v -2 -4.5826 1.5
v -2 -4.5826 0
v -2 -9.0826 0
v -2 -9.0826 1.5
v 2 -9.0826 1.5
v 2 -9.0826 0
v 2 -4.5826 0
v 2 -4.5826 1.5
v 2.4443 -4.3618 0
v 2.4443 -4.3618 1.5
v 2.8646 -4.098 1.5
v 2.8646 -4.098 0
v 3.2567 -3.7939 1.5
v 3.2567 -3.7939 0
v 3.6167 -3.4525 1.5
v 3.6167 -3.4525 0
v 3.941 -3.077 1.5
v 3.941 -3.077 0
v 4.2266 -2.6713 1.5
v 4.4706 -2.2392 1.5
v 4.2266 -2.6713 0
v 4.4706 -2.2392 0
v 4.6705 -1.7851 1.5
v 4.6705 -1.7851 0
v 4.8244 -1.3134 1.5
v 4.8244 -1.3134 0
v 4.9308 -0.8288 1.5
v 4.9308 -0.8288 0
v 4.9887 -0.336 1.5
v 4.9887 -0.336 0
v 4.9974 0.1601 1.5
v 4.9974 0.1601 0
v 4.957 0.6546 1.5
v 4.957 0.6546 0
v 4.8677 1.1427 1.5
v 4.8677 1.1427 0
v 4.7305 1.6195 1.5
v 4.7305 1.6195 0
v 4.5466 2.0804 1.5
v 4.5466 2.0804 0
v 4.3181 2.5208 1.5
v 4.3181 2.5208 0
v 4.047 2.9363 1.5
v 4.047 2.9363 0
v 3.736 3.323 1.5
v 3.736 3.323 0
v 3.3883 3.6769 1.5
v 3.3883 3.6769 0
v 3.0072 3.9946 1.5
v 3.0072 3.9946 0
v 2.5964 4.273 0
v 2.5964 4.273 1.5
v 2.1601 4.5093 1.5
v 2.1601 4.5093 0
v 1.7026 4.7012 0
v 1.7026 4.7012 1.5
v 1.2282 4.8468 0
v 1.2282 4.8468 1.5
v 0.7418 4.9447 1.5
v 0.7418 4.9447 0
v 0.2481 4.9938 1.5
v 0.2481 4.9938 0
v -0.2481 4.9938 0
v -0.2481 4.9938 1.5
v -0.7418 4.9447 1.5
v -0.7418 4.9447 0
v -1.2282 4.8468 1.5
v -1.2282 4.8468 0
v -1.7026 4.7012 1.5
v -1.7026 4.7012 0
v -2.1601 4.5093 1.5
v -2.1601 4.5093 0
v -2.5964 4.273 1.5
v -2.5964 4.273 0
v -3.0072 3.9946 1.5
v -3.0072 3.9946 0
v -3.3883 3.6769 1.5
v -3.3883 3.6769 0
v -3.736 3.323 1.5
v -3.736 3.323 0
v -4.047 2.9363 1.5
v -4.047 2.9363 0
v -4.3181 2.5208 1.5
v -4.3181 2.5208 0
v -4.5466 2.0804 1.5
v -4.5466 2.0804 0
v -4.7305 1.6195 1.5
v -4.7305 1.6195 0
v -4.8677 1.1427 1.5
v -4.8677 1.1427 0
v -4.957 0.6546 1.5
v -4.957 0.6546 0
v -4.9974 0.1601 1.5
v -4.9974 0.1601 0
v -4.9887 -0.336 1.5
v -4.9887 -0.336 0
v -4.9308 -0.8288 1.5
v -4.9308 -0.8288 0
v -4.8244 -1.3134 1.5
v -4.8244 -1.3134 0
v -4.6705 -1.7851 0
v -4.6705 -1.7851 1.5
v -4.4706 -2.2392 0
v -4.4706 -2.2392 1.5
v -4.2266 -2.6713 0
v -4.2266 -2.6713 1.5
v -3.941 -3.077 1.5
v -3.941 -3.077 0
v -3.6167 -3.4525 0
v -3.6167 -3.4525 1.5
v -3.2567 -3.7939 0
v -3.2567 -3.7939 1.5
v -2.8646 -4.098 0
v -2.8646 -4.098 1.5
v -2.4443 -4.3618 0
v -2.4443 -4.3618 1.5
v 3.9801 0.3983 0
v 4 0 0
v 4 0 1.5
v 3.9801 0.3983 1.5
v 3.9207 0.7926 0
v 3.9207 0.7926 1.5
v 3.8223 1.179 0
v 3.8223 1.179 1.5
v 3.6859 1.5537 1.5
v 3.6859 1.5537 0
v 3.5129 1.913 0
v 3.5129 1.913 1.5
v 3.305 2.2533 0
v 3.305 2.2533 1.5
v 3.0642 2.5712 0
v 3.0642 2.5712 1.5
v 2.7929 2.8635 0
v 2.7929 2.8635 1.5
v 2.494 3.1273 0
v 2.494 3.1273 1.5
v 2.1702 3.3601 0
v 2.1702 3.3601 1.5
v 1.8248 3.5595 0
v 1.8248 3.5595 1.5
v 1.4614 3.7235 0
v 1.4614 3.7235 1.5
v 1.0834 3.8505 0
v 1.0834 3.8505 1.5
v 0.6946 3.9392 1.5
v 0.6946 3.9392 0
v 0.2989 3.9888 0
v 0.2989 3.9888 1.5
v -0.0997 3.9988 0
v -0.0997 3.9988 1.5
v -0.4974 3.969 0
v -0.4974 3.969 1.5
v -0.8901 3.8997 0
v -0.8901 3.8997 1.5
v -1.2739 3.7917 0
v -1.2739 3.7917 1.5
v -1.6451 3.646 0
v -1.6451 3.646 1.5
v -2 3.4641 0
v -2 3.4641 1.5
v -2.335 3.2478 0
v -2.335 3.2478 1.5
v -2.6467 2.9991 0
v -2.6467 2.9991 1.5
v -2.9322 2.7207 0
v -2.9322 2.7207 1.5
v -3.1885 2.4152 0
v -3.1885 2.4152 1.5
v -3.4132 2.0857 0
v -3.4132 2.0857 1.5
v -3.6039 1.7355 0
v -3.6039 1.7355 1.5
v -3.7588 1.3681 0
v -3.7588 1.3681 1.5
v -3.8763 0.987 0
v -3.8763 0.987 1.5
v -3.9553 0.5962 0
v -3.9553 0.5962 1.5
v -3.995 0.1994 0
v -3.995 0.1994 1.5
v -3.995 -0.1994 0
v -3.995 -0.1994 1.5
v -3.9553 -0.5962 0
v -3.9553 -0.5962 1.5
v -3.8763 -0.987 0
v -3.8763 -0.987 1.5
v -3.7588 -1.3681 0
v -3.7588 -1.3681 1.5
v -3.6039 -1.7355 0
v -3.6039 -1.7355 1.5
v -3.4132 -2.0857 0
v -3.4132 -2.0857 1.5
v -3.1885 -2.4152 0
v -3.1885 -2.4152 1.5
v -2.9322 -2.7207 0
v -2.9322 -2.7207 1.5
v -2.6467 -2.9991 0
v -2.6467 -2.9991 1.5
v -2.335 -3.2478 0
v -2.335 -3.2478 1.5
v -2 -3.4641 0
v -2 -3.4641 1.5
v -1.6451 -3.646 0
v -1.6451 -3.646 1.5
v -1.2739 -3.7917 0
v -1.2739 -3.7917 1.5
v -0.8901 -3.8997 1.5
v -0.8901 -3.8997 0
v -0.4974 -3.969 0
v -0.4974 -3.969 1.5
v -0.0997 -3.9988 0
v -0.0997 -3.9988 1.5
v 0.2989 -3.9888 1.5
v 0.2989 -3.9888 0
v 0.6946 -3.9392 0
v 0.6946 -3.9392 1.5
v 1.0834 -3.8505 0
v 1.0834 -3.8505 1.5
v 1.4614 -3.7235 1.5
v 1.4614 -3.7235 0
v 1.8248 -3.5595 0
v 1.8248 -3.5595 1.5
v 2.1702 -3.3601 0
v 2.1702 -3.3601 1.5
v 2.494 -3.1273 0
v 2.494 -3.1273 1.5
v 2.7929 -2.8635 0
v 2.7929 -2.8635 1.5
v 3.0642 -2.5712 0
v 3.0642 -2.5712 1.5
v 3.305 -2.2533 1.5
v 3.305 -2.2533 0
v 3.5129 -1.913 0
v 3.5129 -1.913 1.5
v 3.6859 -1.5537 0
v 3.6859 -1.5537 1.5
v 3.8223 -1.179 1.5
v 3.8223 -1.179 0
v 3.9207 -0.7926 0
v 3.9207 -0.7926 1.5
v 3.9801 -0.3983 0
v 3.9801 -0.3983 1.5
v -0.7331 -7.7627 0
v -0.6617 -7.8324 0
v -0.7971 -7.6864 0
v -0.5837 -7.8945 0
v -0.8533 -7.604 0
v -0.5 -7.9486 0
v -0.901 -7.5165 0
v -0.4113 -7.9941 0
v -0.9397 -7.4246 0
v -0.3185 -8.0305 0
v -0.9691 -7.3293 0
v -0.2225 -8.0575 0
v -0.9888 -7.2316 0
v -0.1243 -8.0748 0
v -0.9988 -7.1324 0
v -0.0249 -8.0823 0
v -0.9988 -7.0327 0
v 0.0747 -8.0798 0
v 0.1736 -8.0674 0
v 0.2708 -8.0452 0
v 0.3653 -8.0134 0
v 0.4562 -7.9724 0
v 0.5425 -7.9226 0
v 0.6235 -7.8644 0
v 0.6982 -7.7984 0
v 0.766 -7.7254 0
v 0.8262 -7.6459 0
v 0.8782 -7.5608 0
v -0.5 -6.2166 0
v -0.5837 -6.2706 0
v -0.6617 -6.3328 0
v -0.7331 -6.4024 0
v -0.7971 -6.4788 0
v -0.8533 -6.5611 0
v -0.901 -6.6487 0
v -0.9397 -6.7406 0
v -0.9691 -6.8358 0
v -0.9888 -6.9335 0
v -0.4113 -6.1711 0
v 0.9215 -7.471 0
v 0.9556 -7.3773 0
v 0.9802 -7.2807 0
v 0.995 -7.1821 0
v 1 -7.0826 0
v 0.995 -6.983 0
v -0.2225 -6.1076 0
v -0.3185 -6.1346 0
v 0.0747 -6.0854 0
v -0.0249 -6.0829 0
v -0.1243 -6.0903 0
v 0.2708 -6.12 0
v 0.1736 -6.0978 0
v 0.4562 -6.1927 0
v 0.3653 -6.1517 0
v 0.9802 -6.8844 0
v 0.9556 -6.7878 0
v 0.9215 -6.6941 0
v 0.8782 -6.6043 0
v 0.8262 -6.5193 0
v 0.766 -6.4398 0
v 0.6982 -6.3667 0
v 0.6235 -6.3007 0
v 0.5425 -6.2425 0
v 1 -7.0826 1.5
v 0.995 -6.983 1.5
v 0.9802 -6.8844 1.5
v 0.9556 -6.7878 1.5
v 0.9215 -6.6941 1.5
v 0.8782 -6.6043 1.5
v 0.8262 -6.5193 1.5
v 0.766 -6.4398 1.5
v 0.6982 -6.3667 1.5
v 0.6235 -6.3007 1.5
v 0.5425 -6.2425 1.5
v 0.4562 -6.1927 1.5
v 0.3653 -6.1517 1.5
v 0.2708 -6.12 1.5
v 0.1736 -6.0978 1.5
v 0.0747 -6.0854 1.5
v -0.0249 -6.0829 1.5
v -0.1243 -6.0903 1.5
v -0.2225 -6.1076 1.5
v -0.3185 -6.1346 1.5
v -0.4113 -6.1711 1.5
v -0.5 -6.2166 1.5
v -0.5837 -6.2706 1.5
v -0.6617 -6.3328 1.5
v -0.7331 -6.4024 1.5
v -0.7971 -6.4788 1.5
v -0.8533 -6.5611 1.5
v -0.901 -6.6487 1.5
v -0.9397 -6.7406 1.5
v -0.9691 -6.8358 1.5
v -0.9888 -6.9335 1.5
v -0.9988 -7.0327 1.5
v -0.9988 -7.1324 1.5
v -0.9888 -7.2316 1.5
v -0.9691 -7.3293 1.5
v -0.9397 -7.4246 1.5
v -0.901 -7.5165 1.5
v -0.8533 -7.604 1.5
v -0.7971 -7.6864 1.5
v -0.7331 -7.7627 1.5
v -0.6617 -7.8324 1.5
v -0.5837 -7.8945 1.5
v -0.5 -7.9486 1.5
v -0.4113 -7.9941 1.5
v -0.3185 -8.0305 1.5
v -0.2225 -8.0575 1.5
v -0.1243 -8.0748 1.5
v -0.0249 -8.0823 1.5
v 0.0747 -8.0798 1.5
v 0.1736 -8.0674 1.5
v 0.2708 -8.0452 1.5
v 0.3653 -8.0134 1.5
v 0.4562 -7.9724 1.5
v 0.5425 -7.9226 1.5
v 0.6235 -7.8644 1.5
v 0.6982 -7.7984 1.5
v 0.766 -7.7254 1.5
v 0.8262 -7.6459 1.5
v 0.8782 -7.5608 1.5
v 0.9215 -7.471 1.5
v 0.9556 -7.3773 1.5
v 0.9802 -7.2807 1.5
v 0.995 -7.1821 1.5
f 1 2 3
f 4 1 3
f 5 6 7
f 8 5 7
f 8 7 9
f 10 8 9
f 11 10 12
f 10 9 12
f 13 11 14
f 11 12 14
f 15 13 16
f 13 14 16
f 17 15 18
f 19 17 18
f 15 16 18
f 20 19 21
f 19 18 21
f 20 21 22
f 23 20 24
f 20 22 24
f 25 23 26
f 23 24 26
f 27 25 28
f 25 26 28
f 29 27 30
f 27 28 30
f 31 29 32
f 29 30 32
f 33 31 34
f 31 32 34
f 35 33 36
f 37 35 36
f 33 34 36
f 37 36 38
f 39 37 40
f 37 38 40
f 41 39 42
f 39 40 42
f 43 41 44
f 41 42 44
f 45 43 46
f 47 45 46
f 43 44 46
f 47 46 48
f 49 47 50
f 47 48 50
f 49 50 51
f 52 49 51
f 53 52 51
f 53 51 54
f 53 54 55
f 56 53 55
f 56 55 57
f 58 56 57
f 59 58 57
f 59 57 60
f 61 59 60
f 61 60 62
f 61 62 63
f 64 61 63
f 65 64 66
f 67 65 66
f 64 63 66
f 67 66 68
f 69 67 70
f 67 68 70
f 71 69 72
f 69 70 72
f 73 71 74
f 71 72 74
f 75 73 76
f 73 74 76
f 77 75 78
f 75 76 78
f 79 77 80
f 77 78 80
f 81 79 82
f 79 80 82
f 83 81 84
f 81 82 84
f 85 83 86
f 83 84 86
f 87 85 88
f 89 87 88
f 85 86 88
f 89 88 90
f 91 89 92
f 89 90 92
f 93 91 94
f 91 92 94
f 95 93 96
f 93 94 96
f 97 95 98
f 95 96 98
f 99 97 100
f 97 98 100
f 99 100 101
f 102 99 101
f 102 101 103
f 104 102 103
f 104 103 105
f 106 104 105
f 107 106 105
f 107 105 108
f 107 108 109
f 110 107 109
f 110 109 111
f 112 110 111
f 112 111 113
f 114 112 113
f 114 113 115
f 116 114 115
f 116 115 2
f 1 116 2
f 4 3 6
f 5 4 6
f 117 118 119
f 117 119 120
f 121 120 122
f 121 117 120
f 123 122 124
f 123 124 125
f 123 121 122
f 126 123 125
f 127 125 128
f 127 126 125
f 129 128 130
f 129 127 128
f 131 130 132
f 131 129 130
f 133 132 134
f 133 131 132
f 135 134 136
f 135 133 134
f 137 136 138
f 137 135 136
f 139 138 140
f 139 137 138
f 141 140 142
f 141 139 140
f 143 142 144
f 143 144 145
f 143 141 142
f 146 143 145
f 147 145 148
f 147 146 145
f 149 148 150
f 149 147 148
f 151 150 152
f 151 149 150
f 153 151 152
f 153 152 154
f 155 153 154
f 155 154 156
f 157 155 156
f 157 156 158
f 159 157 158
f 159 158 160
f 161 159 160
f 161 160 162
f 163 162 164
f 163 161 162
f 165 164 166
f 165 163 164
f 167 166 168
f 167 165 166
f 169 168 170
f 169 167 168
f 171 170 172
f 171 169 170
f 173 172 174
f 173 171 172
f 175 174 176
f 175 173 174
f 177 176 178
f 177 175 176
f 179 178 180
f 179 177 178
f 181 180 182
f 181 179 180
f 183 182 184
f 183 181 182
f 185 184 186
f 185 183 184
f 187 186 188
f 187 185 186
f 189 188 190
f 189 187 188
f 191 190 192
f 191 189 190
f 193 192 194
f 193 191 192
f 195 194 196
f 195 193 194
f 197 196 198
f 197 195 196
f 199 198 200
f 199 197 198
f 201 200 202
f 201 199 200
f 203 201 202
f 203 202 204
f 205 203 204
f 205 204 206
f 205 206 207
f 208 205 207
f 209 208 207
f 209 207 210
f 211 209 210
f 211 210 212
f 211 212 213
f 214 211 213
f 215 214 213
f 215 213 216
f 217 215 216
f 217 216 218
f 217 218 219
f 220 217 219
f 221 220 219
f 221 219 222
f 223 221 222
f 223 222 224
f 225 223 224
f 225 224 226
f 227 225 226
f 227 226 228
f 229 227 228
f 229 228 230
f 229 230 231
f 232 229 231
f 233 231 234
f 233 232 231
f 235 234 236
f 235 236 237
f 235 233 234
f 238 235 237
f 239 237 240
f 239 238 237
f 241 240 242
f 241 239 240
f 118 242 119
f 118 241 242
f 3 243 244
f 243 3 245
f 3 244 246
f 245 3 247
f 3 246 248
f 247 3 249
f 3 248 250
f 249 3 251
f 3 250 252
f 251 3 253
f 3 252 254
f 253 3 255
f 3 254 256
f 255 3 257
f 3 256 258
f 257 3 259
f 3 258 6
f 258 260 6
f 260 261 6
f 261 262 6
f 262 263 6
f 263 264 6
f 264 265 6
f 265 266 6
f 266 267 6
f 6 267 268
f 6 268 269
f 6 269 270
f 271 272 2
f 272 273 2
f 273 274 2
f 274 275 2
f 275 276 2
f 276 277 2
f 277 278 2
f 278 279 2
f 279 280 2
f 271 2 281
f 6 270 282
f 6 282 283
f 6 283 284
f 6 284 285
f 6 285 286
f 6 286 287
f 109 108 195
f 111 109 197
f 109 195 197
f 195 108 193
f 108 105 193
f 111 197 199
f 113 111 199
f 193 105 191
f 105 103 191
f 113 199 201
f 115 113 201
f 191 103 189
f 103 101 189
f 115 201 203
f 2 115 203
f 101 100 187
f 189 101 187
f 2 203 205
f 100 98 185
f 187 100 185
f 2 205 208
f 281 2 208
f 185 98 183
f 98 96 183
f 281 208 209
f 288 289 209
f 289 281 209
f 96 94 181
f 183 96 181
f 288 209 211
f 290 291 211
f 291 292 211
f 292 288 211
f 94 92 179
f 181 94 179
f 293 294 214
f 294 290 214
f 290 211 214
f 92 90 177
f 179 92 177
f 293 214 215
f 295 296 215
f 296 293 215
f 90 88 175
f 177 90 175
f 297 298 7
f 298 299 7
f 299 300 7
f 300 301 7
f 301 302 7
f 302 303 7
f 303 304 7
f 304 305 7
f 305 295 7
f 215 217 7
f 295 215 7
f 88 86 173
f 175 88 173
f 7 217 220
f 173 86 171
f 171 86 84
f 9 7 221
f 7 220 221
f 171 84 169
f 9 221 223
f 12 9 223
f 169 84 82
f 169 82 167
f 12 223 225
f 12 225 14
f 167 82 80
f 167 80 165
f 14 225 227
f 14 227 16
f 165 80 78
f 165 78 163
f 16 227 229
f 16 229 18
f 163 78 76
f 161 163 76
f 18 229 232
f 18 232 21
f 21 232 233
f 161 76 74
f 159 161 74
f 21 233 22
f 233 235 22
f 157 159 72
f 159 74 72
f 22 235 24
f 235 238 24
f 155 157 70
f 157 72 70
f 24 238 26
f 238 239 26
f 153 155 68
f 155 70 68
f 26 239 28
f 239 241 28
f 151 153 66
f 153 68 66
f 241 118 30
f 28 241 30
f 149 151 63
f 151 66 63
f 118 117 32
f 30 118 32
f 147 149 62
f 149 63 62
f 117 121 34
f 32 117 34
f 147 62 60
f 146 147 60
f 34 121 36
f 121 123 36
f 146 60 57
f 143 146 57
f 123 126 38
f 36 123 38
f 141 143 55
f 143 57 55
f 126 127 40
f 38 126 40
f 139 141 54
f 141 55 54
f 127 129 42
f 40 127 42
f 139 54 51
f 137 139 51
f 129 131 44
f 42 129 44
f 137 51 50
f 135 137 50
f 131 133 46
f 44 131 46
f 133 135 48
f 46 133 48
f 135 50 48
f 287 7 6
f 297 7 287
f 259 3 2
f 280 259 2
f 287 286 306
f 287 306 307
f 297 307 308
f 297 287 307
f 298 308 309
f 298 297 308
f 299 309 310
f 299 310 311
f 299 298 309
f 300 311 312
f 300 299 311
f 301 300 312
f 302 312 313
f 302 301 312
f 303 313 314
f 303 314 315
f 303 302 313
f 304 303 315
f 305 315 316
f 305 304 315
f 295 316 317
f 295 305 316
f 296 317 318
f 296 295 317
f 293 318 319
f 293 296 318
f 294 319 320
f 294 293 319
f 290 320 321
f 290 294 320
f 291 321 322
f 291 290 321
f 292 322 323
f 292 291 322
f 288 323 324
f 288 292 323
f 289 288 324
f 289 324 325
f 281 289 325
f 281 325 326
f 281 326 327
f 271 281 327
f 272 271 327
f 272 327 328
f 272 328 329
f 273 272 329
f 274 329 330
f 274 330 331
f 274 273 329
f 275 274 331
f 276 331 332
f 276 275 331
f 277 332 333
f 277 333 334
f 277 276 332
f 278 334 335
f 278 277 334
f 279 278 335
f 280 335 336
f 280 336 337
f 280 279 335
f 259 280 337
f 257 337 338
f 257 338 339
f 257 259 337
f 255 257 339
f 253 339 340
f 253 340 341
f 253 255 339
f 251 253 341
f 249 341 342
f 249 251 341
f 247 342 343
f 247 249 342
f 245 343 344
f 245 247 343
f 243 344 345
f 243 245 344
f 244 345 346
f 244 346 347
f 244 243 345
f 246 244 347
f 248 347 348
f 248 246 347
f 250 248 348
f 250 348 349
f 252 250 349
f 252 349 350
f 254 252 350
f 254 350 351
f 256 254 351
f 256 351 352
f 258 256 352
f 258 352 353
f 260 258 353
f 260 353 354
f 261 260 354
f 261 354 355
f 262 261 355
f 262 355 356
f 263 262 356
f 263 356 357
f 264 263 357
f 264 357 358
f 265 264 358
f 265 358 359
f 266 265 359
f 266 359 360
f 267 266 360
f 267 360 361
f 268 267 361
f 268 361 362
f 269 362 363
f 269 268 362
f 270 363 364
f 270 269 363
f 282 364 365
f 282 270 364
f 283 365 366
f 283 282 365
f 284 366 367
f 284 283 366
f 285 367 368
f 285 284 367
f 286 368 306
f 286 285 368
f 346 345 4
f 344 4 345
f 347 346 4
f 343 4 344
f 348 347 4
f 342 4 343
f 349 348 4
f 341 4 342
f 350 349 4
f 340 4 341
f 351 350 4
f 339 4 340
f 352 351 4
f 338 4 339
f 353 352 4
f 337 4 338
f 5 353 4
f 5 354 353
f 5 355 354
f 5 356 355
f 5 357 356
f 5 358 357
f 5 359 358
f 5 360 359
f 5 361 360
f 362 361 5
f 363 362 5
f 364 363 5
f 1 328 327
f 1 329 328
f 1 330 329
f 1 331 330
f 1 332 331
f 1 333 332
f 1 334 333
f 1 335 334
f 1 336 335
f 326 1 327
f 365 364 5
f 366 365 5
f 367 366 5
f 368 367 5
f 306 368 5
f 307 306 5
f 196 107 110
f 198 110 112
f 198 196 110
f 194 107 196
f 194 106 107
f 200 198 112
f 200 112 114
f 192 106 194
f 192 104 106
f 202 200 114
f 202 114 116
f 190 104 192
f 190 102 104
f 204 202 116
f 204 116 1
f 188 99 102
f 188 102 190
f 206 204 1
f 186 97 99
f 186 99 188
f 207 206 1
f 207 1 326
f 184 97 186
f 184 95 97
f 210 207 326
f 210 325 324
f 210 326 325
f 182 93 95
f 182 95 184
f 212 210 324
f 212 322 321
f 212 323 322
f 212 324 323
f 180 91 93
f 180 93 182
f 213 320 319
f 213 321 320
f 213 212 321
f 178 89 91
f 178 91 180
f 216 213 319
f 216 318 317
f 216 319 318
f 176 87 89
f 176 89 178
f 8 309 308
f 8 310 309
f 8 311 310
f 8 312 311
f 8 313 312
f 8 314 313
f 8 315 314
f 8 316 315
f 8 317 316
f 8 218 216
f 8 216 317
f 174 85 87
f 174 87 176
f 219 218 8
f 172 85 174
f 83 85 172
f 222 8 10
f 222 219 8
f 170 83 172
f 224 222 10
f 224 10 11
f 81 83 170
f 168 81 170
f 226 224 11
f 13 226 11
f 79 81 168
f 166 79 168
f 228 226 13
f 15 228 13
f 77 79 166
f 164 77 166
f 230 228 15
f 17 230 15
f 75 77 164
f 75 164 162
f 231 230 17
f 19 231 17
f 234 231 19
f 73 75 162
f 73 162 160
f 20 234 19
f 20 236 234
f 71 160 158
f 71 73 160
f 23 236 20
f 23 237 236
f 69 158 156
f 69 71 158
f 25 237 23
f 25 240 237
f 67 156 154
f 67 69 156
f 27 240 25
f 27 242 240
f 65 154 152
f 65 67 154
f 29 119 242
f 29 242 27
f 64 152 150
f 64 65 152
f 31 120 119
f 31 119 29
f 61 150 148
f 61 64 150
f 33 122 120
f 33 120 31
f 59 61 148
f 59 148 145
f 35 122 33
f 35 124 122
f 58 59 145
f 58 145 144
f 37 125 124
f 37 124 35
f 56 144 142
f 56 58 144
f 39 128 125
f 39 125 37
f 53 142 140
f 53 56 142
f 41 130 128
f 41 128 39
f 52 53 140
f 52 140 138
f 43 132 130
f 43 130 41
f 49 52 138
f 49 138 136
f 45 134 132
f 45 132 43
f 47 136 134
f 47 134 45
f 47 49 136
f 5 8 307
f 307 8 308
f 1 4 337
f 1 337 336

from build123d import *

# Parameters (mm, degrees)
SKETCH_1_R      = 1
SKETCH_1_R_2    = 4
EXTRUDE_1_DEPTH = 1.5


with BuildPart() as part:
    # 草图1 → 凸台-拉伸1 (new body)
    with BuildSketch(Plane.XY):
        with BuildLine():
            Line((-2, -9.082575695), (2, -9.082575695))
            Line((2, -9.082575695), (2, -4.582575695))
            ThreePointArc((2, -4.582575695), (0, 5), (-2, -4.582575695))
            Line((-2, -4.582575695), (-2, -9.082575695))
        make_face()
        with Locations((0, -7.082575695)):
            Circle(SKETCH_1_R, mode=Mode.SUBTRACT)
        Circle(SKETCH_1_R_2, mode=Mode.SUBTRACT)
    extrude(amount=EXTRUDE_1_DEPTH)


solid = part.part
